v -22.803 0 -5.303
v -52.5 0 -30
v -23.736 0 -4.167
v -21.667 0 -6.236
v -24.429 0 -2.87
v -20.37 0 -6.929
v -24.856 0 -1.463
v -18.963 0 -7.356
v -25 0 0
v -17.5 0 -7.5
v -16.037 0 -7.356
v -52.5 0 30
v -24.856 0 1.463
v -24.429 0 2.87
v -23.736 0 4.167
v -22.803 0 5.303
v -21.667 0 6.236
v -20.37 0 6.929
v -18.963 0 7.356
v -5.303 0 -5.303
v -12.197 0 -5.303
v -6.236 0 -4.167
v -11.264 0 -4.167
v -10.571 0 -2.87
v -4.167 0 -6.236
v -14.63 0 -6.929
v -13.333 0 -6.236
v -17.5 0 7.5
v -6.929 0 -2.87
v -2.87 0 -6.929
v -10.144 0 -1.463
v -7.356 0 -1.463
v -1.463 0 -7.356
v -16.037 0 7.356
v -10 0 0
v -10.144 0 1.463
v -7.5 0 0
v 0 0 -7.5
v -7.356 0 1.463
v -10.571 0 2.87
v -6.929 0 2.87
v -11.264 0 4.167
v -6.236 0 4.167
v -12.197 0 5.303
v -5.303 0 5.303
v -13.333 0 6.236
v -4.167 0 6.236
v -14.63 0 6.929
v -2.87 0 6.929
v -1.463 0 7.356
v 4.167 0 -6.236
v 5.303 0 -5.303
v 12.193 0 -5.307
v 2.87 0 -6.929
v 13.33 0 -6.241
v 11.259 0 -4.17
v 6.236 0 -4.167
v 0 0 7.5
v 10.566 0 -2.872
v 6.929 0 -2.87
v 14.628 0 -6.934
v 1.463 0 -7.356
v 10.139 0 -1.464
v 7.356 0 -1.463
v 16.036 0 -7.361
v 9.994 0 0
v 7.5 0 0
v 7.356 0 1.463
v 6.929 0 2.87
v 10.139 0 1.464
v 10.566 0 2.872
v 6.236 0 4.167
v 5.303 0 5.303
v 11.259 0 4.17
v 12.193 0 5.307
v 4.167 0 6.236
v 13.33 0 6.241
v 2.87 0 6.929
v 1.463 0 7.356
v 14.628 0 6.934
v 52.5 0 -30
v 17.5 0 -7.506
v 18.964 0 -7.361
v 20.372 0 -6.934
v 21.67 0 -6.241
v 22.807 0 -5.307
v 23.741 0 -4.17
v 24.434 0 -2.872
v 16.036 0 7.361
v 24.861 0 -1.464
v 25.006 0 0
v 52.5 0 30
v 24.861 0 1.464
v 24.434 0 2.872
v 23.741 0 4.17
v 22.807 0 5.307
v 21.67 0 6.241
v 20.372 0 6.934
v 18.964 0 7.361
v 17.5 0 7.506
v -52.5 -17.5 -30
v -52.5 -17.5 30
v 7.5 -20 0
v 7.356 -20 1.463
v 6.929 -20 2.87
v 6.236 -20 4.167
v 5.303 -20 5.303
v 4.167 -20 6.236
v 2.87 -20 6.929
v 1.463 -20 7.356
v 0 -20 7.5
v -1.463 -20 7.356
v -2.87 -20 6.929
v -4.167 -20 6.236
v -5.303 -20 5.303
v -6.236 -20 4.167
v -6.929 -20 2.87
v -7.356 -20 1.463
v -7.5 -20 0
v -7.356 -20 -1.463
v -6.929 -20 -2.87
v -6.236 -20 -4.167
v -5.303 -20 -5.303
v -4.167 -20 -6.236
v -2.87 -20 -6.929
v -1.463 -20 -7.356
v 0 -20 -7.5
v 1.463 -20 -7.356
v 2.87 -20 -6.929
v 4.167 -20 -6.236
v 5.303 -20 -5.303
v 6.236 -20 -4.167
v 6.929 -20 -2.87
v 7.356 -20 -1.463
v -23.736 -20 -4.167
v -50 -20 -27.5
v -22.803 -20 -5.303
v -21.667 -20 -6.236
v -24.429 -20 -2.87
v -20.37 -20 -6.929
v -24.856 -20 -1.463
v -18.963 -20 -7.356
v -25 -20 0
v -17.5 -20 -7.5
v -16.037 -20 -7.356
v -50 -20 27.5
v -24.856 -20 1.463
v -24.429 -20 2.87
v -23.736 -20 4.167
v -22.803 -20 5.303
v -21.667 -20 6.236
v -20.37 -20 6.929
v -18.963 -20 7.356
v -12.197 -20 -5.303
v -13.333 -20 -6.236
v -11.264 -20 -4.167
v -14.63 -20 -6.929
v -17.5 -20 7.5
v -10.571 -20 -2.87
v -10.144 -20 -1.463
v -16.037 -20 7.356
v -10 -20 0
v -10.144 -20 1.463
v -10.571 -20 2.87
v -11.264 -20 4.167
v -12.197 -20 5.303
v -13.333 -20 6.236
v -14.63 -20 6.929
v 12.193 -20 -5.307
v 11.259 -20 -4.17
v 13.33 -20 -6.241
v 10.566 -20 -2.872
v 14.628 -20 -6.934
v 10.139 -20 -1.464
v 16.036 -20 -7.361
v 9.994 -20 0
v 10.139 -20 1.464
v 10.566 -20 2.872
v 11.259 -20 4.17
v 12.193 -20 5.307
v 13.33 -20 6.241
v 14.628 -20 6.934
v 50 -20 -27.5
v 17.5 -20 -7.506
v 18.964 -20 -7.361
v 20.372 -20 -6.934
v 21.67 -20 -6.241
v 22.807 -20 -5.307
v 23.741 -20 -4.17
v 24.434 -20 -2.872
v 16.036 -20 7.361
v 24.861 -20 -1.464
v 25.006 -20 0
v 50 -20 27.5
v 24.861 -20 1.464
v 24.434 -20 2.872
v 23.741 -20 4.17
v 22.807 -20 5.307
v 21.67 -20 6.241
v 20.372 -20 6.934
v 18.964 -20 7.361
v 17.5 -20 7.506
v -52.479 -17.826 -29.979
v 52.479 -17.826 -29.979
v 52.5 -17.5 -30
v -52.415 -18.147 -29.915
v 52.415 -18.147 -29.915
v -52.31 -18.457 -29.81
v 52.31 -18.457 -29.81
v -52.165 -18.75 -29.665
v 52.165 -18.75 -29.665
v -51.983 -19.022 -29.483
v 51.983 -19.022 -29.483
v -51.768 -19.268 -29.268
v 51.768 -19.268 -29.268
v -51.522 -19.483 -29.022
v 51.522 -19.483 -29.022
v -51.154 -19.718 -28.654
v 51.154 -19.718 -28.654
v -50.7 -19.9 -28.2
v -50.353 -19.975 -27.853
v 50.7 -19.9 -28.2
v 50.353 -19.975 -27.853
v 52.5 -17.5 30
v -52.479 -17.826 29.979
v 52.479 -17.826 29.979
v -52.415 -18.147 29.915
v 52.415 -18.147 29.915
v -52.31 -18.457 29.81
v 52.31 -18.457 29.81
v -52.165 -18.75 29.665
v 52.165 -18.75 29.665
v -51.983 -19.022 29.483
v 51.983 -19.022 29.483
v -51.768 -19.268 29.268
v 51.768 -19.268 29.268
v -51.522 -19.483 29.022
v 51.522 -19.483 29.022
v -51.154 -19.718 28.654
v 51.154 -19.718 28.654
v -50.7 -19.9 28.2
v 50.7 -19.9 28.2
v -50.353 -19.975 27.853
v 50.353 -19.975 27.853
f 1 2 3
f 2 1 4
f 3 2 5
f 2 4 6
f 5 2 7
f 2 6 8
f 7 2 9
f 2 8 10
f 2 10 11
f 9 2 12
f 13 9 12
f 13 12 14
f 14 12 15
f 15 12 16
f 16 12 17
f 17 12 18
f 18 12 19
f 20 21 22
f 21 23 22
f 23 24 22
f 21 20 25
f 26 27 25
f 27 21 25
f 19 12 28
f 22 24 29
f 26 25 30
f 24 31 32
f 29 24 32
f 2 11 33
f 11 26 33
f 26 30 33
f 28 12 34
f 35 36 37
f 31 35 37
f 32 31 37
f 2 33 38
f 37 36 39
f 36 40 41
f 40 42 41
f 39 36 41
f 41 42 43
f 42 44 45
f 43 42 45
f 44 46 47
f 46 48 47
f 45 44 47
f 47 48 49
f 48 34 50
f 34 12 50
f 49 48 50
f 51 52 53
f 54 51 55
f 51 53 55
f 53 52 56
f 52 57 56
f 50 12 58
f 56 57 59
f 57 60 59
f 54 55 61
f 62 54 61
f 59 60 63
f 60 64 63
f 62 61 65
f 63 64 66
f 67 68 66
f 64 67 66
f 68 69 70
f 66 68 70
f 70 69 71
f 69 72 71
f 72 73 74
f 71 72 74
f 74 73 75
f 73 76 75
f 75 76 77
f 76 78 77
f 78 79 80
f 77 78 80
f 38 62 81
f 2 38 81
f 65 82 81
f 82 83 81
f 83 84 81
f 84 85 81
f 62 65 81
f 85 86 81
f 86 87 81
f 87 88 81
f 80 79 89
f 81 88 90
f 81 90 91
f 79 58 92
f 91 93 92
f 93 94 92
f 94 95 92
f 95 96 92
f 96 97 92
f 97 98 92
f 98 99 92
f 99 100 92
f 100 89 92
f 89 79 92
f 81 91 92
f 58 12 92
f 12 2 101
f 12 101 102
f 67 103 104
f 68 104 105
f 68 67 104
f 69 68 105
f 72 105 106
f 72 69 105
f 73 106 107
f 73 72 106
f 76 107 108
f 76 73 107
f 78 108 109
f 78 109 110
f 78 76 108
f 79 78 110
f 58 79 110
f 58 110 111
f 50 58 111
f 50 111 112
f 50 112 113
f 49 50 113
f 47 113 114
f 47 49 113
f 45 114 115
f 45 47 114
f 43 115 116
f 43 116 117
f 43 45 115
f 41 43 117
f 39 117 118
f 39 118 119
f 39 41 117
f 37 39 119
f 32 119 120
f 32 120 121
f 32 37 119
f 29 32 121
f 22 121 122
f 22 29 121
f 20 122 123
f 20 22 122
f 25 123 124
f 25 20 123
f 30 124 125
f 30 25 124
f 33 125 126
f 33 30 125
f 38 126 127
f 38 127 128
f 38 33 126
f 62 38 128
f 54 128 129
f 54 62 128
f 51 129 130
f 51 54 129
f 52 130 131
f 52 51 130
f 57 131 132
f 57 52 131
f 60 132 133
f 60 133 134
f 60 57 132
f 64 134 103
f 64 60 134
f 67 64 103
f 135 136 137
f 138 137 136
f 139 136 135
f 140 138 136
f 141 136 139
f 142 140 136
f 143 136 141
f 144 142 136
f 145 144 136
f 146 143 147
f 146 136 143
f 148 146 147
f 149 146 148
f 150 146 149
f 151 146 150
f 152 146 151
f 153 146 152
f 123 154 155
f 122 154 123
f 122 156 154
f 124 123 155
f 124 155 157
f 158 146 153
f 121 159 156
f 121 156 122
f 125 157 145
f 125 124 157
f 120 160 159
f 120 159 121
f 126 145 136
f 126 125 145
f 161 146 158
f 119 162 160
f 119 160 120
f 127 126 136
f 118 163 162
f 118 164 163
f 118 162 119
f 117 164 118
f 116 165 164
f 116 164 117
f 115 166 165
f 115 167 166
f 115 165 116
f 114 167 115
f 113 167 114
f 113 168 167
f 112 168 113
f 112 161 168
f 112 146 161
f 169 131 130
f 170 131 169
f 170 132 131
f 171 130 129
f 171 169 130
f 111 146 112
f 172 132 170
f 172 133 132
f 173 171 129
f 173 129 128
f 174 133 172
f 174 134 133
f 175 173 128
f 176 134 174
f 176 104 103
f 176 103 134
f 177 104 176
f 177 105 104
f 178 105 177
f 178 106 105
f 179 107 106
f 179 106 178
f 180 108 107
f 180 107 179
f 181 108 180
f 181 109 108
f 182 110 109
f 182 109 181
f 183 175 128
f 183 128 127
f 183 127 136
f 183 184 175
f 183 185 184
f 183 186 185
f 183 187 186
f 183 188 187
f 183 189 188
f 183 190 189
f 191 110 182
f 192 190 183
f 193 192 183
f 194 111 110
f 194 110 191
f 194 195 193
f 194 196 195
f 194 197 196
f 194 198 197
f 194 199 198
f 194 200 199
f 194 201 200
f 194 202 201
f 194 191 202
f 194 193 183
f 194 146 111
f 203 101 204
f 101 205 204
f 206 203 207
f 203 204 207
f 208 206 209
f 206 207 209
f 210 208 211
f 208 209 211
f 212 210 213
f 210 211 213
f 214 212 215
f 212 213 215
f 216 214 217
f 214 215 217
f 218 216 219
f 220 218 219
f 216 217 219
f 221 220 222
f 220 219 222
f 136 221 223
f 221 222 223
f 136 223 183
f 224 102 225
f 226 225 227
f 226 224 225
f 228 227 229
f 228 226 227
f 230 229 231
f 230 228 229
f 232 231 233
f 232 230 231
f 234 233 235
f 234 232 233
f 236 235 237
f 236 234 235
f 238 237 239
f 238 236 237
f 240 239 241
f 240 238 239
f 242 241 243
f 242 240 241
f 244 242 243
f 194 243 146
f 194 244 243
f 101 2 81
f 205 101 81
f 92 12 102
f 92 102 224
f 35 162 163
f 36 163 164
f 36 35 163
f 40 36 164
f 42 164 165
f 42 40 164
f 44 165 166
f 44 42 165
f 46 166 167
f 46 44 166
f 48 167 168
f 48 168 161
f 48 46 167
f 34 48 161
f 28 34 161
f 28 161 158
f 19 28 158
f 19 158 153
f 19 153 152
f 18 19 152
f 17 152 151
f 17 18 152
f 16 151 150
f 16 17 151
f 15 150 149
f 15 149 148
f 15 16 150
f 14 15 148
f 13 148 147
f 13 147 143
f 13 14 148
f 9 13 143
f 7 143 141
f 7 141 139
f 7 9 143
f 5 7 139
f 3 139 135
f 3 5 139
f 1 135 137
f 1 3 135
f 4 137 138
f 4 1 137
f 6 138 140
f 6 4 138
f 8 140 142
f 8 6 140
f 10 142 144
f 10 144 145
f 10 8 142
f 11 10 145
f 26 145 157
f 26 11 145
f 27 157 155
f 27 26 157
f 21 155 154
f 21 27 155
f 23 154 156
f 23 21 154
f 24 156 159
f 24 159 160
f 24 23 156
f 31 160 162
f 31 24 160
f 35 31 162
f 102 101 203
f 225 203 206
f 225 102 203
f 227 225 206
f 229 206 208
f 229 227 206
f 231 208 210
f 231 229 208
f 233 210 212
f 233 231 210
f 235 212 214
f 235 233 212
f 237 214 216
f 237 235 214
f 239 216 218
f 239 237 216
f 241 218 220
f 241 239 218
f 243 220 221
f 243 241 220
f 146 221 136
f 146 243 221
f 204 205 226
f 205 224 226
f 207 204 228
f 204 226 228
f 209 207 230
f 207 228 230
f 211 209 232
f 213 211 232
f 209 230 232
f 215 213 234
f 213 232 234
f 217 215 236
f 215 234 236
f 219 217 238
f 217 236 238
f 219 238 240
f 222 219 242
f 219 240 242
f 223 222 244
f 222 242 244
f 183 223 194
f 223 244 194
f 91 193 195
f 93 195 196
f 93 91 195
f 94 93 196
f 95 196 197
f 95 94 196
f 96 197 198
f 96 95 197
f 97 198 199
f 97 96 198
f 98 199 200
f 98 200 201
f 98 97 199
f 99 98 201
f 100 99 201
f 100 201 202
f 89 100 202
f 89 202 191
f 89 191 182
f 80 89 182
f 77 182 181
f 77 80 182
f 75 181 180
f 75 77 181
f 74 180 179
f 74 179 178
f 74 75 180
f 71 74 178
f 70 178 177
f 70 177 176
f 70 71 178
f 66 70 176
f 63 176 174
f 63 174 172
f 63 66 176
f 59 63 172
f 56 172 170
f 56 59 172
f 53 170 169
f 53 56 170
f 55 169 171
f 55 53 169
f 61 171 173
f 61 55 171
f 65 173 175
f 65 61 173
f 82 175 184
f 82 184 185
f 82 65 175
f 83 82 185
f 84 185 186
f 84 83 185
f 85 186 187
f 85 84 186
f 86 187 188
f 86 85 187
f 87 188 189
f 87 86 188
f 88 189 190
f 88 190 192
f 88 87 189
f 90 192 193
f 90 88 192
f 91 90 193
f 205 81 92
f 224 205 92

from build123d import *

# Parameters (mm, degrees)
F0_W     = 105
F0_H     = 60
F0_R     = 7.5
F0_R_2   = 7.5057
F1_DEPTH = 20
F2_R     = 2.5


with BuildPart() as f1:
    # F0 (on Front) → F1 (new body)
    with BuildSketch(Plane.XZ):
        Rectangle(F0_W, F0_H)
        with Locations((-17.5, 0)):
            Circle(F0_R, mode=Mode.SUBTRACT)
        Circle(F0_R, mode=Mode.SUBTRACT)
        with Locations((17.5, 0)):
            Circle(F0_R_2, mode=Mode.SUBTRACT)
    extrude(amount=F1_DEPTH)

    # F2
    f2_edges = [f1.edges().sort_by_distance(p)[0] for p in [
        (-52.5, -20, 0),
        (0, -20, 30),
        (0, -20, -30),
        (52.5, -20, 0),
    ]]
    fillet(f2_edges, radius=F2_R)


solid = f1.part
